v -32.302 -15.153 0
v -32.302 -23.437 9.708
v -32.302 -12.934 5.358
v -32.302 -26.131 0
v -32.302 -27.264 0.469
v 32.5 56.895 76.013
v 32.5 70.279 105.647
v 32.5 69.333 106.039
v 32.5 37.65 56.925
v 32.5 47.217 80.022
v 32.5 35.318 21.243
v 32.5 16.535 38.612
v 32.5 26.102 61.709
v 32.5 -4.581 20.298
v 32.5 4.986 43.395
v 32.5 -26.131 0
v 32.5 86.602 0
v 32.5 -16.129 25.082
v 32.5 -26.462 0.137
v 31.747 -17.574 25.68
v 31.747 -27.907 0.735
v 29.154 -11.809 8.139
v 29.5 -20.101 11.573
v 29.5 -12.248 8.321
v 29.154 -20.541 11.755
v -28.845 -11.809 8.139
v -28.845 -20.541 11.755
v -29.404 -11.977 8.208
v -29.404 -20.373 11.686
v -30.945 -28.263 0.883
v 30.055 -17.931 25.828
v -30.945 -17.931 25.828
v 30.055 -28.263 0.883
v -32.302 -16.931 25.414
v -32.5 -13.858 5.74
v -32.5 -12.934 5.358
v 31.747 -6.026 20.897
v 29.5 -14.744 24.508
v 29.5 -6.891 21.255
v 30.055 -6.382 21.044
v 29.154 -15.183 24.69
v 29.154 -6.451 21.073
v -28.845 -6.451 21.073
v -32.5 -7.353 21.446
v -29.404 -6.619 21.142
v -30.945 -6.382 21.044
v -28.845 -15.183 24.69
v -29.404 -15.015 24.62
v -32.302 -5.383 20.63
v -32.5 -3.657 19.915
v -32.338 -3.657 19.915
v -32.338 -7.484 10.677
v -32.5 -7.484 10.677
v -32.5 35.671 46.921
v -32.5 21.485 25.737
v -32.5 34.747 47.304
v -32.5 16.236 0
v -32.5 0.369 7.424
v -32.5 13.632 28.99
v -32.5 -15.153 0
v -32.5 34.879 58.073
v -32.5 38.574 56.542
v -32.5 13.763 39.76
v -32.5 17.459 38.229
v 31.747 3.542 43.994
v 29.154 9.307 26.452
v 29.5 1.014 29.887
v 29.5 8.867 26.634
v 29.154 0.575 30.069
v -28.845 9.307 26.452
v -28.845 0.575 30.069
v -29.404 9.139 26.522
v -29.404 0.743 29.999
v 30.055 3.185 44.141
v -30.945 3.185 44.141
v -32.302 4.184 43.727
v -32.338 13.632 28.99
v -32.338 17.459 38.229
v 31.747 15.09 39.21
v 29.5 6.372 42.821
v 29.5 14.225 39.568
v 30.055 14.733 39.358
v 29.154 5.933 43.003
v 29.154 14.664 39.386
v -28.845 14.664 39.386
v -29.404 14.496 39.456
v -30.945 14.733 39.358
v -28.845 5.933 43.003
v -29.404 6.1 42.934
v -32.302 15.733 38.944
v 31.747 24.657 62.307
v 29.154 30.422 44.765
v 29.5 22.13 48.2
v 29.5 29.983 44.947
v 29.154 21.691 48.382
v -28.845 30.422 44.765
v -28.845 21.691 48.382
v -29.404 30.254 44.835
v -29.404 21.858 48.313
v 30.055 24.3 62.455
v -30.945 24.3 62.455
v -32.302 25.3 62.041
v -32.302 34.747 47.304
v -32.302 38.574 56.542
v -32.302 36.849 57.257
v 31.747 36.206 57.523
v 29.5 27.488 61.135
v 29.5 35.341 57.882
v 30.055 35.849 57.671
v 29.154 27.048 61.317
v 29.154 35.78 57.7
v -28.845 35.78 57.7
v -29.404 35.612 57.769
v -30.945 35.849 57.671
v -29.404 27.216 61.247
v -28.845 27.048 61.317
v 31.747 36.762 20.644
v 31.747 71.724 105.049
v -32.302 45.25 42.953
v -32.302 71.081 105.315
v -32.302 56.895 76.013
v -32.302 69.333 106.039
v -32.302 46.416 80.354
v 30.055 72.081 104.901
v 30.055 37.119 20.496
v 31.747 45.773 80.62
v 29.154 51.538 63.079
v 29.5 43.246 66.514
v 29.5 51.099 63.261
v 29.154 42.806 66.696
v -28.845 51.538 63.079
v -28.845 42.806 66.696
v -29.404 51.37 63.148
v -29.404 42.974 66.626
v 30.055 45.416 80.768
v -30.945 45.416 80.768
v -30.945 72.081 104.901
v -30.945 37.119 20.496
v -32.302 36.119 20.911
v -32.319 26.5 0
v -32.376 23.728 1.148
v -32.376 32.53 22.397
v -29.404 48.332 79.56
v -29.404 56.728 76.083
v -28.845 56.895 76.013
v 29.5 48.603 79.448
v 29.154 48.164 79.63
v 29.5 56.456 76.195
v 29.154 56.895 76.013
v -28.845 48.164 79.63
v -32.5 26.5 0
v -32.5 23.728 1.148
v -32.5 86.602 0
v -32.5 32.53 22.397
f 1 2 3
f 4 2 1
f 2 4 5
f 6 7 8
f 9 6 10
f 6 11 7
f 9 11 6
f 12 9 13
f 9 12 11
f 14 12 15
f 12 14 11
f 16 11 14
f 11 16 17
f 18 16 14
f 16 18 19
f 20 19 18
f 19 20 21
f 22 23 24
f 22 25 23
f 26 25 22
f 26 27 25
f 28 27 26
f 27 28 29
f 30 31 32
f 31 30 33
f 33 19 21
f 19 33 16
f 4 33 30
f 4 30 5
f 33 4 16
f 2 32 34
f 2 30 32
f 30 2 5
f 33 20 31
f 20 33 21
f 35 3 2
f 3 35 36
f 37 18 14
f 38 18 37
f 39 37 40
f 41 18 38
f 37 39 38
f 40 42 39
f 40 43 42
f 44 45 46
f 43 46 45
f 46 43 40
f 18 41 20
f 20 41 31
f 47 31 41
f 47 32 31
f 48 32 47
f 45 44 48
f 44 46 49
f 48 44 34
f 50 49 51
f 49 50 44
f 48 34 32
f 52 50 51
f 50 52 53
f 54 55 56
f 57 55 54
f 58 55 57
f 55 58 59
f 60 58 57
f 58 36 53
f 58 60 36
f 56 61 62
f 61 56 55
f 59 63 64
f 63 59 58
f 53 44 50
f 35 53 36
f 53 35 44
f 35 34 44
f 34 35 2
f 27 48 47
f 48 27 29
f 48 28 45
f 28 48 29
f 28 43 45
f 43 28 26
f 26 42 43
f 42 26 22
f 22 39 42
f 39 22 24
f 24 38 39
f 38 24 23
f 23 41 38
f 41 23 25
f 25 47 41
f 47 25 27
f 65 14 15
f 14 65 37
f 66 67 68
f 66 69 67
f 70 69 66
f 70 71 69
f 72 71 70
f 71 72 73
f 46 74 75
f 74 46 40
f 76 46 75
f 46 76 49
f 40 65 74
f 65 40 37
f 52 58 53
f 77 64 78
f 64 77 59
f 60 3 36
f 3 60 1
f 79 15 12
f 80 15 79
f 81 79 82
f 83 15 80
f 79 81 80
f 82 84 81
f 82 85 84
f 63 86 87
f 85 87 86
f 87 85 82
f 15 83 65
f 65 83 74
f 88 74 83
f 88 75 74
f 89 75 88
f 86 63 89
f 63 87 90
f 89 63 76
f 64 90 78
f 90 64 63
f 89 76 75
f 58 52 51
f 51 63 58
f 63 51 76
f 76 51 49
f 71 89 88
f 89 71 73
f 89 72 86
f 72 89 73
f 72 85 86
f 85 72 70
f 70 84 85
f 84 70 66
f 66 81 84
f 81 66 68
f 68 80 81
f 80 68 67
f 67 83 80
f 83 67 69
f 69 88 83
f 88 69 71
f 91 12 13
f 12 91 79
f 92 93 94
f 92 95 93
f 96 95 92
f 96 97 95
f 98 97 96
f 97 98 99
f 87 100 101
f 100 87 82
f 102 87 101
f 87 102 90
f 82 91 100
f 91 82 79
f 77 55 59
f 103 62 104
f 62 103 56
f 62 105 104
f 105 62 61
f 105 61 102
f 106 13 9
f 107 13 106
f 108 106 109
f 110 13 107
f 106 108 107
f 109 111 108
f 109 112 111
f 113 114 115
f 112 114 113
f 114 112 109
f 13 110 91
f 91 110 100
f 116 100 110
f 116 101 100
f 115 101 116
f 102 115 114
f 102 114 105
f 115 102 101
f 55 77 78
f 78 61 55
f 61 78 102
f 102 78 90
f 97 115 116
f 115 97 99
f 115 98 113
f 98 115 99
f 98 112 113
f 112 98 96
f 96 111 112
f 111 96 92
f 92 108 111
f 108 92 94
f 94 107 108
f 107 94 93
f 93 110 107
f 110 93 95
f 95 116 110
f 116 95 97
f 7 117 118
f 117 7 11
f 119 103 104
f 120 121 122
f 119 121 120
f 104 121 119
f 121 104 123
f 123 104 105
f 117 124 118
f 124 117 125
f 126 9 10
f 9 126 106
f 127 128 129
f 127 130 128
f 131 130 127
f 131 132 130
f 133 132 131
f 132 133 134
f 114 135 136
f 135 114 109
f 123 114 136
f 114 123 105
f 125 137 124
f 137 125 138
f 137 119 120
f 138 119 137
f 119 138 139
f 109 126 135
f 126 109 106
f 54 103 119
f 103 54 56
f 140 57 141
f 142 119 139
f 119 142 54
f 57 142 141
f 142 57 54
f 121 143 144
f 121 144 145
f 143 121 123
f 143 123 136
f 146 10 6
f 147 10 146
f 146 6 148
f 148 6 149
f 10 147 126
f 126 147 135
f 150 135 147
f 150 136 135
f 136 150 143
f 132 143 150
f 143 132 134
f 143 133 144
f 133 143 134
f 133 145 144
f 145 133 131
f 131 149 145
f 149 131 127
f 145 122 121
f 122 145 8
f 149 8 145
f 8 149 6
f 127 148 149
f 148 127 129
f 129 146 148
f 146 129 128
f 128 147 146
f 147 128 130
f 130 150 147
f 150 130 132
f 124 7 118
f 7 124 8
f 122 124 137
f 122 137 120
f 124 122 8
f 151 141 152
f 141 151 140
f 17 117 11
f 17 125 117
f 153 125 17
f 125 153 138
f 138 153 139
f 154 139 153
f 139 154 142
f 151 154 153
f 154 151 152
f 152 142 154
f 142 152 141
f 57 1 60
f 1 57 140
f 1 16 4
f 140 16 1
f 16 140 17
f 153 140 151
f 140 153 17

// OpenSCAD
module hulled_card(size, thickness, front_square=false, rear_square=false) {
    // draw a card including a square or circle hull
    hull() {
        square([size[1], size[2]]); // card
        // place a circle or square in each corner
        color("blue")
        for (corner_i = [0, 1]) {
            for (corner_j = [0, 1]) {
                translate([corner_i*size[1] + (corner_i*2-1)*thickness/2,
                           corner_j*size[2] + (corner_j*2-1)*thickness/2]) {
                    // square or circle, depending on front or rear
                    if (   (corner_j == 0 && front_square)
                        || (corner_j == 1 && rear_square)) {
                        square(thickness, center=true);
                    } else {
                        circle(thickness/2);
                    }
                }
            }
        }
    }
}

module hulled_card_border(size, spacing, thickness, front_square=false, rear_square=false, rear_only=false) {
    // draw only the border of a card (of thickness)
    difference() {
        hulled_card(size, spacing+thickness, front_square=front_square, rear_square=rear_square);
        if (!rear_only) {
            hulled_card(size, spacing);
        } else {
            translate([-(thickness + spacing), -(thickness + spacing), 0])
            hulled_card([size[0], size[1]+thickness*2+spacing*2, size[2]+thickness+spacing], spacing);
        }
    }
}

module cardholder_part(size, spacing, thickness, visibility, raise, delta, front, rear, rear_visibility, extend_down=10, show_carts=false) {
    // there are three sections:
    // filled
    translate([0, 0, -extend_down]) {
        linear_extrude(raise+thickness + extend_down) {
            hulled_card(size, spacing+thickness);
        }
        // with card hole and front square, up to the height of the previous card holder
        if (!front) {
            linear_extrude(raise-delta+thickness+spacing+size[0] * (1-visibility)) {
                hulled_card_border(size, spacing, thickness, front_square=!front, rear_square=!rear);
            };
        }
    }
    // and the rest, up to visibility
    linear_extrude(raise+thickness + spacing + size[0] * (1-visibility)) {
        hulled_card_border(size, spacing, thickness, rear_square=!rear);
    };
    if (rear) {
        linear_extrude(raise+thickness + spacing + size[0] * (1-rear_visibility)) {
            hulled_card_border(size, spacing, thickness, rear_square=!rear, rear_only=true);
        };
    }
    
    if (show_carts) {
        // draw a fake card
        translate([0, 0, raise])
        color("gray") render() color("gray") cube([size[1], size[2], size[0]]);
    }
}

module cardholder(size=[85, 54, 1], thickness=3, spacing=1, cards=4, delta=25, visibility=0.3, rear_visibility=0.2, angle=0, crop_bottom=false, show_carts=false) {
    // hard conditions in the assignment
    if (len(size) > 1
        && size[0] > 0 && size[1] > 0
        && cards > 0) {
        // make sure size is 3-tuple
        size_ = [size[0], size[1], len(size) < 3 ? 0 : size[2]];
        // clamp the visibility, thickness, and spacnig
        visibility_ = visibility < 0 ? 0 : visibility > 1 ? 1 : visibility;
        thickness_  = thickness  < 0 ? 0 : thickness;
        spacing_    = spacing    < 0 ? 0 : spacing;
        // use an absolute delta
        delta_ = abs(delta);
        // prepare for rotation if delta is negative
        rot = delta < 0;
        // calculate the width and length so the structure can be centered.
        holder_width = thickness_*2 + spacing_*2 + size_[1];
        holder_length = (thickness_ + spacing_*2 + size_[2]) * cards + thickness_;
        // I only used this to verify
        holder_height = (delta_*(cards-1))  + (thickness_ + spacing_ + size_[0] * (1-visibility_));
        
        // this is crude: we cut off the parts of the cartholder
        // that end up under ground
        difference() {
            union() {
                // rotate if delta was negative
                rotate([0, 0, rot ? 180 : 0])
                // lay the card holder down
                rotate([-angle, 0, 0])
                // center the card holder as requested
                translate([-holder_width/2, -holder_length/2, 0]) {
                    // for each card
                    for (i = [0 : cards-1]) {
                        // render the card holder part, including the filled part from
                        // the ground, properly shifted so that it overlays the previous
                        // card holder part's rear thickness.
                        translate([thickness_+spacing_, thickness_+spacing_+i*(thickness_+spacing_*2+size_[2]), 0])
                            cardholder_part(size_, spacing_, thickness_, visibility_, delta_*i,
                            delta_,
                            front = i == 0,
                            rear  = i == cards-1,
                            rear_visibility = rear_visibility,
                            show_carts = show_carts);
                    }
                };
                
                if (angle) {
                    // add a back stand for stability
                    translate([-holder_width/2, holder_length/2, 0])
                    rotate([-angle, 0, 0])
                    translate([0, -thickness, 0])
                    cube([holder_width, holder_height, holder_height/4]);
                }
            }
            
            if (crop_bottom) {
                // a huge cube under the cartholder
                color("red") translate([-500, -500, -1000]) cube([1000, 1000, 1000]);
            }
            
        }
        
   }
}

angle = 22.5;
cardholder([65, 57, 7.5], thickness=3, spacing=1, cards=4, delta=25, visibility=0.8, angle=angle, rear_visibility=0.3, crop_bottom=true, show_carts=false);
